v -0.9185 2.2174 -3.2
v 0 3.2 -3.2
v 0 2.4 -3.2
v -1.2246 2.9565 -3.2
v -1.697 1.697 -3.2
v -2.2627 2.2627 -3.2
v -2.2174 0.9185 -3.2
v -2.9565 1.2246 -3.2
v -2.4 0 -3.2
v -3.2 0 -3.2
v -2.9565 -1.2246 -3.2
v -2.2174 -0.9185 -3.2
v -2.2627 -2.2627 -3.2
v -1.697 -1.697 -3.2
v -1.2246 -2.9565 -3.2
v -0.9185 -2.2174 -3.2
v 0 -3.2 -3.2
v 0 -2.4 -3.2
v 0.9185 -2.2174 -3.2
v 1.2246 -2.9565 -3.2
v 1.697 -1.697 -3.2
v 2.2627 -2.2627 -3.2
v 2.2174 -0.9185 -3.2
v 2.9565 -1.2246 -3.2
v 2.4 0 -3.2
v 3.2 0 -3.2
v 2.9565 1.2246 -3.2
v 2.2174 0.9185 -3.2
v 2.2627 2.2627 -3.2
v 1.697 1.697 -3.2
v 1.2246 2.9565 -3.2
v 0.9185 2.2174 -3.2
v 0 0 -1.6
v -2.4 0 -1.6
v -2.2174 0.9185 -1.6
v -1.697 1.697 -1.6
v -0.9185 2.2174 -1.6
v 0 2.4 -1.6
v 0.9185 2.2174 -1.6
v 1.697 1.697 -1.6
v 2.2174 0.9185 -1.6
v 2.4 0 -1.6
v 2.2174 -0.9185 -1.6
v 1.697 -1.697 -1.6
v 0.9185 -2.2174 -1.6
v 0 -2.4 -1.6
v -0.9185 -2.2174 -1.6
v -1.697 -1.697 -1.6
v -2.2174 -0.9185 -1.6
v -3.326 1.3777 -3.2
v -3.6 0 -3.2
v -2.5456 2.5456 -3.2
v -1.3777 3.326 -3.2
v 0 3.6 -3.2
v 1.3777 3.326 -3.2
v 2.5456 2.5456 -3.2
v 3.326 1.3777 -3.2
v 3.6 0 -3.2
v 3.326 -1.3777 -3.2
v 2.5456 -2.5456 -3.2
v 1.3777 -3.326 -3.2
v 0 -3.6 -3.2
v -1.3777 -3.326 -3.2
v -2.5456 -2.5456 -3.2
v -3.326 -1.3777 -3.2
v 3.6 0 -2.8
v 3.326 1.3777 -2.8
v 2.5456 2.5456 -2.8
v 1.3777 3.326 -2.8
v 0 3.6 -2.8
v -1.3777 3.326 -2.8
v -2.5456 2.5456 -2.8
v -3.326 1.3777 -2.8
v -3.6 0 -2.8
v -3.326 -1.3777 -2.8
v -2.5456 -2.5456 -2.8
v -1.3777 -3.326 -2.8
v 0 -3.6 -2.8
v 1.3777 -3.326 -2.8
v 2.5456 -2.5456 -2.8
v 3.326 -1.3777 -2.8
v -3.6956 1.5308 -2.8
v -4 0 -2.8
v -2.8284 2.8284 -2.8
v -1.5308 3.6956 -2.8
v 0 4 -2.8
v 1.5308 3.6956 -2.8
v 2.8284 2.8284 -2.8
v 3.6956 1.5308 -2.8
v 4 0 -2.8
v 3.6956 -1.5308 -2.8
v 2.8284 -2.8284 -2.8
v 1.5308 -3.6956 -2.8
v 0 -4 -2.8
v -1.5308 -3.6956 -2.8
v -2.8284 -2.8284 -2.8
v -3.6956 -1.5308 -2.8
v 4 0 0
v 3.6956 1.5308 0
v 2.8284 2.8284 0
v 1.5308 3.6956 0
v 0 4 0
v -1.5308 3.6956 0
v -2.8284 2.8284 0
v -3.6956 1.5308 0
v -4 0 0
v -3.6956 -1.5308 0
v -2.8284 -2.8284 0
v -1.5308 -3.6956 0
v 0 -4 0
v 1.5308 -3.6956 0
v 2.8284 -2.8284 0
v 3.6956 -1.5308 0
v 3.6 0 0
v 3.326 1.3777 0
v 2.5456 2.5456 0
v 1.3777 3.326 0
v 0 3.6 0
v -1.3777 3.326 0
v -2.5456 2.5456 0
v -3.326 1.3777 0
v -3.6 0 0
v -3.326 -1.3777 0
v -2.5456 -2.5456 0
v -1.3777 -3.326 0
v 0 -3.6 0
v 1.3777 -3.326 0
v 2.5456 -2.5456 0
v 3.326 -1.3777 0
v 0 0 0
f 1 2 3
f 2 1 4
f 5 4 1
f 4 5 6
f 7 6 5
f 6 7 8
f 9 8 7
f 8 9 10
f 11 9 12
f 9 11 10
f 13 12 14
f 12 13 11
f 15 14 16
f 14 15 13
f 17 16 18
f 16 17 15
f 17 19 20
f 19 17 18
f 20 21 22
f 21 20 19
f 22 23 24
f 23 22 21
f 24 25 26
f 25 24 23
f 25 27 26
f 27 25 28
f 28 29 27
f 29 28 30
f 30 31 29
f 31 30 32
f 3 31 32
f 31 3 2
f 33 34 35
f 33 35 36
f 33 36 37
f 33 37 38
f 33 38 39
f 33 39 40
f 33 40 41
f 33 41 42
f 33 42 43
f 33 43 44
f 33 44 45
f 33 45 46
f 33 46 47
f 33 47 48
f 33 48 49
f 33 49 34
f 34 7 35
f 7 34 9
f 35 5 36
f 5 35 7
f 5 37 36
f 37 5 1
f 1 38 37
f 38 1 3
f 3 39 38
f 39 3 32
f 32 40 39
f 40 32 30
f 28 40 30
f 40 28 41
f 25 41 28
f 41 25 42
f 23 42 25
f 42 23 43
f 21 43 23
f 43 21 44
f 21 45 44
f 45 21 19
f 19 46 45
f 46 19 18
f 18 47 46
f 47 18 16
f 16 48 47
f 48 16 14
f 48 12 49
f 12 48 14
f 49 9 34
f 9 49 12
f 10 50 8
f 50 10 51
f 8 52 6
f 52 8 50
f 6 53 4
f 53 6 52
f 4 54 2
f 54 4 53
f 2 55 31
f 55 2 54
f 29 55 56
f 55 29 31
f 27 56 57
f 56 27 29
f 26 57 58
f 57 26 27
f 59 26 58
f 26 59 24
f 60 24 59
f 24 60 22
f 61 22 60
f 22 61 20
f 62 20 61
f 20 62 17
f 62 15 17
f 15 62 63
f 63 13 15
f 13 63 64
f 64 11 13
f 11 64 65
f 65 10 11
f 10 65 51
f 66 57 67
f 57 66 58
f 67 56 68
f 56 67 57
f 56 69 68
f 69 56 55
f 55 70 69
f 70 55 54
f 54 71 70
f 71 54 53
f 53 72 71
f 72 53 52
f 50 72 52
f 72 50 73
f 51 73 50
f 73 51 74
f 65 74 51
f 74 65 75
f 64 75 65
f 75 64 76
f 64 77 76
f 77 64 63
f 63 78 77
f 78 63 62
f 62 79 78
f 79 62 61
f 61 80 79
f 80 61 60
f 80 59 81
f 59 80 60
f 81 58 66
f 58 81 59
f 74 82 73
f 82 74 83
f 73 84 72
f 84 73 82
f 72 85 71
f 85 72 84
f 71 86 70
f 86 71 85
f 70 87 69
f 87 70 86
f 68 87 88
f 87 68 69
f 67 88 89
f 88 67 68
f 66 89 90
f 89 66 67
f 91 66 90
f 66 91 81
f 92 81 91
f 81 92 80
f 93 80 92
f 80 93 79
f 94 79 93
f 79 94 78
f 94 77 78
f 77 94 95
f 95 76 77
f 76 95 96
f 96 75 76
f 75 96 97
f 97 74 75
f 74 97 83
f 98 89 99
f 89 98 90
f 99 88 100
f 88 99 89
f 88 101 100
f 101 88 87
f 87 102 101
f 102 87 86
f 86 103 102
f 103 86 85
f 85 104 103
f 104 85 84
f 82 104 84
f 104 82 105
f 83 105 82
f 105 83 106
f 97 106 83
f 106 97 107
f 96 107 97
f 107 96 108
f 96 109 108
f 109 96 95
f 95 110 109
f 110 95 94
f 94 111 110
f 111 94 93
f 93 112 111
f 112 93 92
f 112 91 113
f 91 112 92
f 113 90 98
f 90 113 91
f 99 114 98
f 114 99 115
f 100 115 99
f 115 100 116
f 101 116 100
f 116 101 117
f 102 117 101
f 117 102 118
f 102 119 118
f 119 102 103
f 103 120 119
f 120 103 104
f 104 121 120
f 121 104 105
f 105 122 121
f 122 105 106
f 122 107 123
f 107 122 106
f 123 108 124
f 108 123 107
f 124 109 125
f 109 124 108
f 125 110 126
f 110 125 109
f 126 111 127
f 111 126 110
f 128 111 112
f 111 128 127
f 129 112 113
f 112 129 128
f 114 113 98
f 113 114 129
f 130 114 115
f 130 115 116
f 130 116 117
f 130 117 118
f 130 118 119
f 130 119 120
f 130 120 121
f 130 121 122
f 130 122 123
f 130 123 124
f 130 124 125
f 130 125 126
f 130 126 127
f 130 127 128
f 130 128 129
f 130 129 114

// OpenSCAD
// file: ../p/4-4ring3.scad
use <../lib.scad>
function ldraw_lib__4_4ring3() = [
// 0 Ring  3 x 1.0
// 0 Name: 4-4ring3.dat
// 0 Author: James Jessiman
// 0 !LDRAW_ORG Primitive UPDATE 2009-01
// 0 !LICENSE Licensed under CC BY 2.0 and CC BY 4.0 : see CAreadme.txt
// 
// 0 BFC CERTIFY CCW
  [0,"BFC","CERTIFY"],
  [0,"BFC","CCW"],
// 
// 0 !HISTORY 1998-12-15 [PTadmin] Official Update 1998-10
// 0 !HISTORY 2002-04-05 [hafhead] Added BFC statement
// 0 !HISTORY 2002-04-25 [PTadmin] Official Update 2002-02
// 0 !HISTORY 2007-06-24 [PTadmin] Header formatted for Contributor Agreement
// 0 !HISTORY 2008-07-01 [PTadmin] Official Update 2008-01
// 0 !HISTORY 2008-08-26 [cwdee] Switch polygon winding and rename
// 0 !HISTORY 2009-05-02 [PTadmin] Official Update 2009-01
// 
// 
// 4 16 -1.5308 0 3.6956 -1.1481 0 2.7717 0 0 3 0 0 4
  [4,16,-1.5308,0,3.6956,-1.1481,0,2.7717,0,0,3,0,0,4],
// 4 16 -2.8284 0 2.8284 -2.1213 0 2.1213 -1.1481 0 2.7717 -1.5308 0 3.6956
  [4,16,-2.8284,0,2.8284,-2.1213,0,2.1213,-1.1481,0,2.7717,-1.5308,0,3.6956],
// 4 16 -3.6956 0 1.5308 -2.7717 0 1.1481 -2.1213 0 2.1213 -2.8284 0 2.8284
  [4,16,-3.6956,0,1.5308,-2.7717,0,1.1481,-2.1213,0,2.1213,-2.8284,0,2.8284],
// 4 16 -4 0 0 -3 0 0 -2.7717 0 1.1481 -3.6956 0 1.5308
  [4,16,-4,0,0,-3,0,0,-2.7717,0,1.1481,-3.6956,0,1.5308],
// 4 16 -3.6956 0 -1.5308 -2.7717 0 -1.1481 -3 0 0 -4 0 0
  [4,16,-3.6956,0,-1.5308,-2.7717,0,-1.1481,-3,0,0,-4,0,0],
// 4 16 -2.8284 0 -2.8284 -2.1213 0 -2.1213 -2.7717 0 -1.1481 -3.6956 0 -1.5308
  [4,16,-2.8284,0,-2.8284,-2.1213,0,-2.1213,-2.7717,0,-1.1481,-3.6956,0,-1.5308],
// 4 16 -1.5308 0 -3.6956 -1.1481 0 -2.7717 -2.1213 0 -2.1213 -2.8284 0 -2.8284
  [4,16,-1.5308,0,-3.6956,-1.1481,0,-2.7717,-2.1213,0,-2.1213,-2.8284,0,-2.8284],
// 4 16 0 0 -4 0 0 -3 -1.1481 0 -2.7717 -1.5308 0 -3.6956
  [4,16,0,0,-4,0,0,-3,-1.1481,0,-2.7717,-1.5308,0,-3.6956],
// 4 16 1.5308 0 -3.6956 1.1481 0 -2.7717 0 0 -3 0 0 -4
  [4,16,1.5308,0,-3.6956,1.1481,0,-2.7717,0,0,-3,0,0,-4],
// 4 16 2.8284 0 -2.8284 2.1213 0 -2.1213 1.1481 0 -2.7717 1.5308 0 -3.6956
  [4,16,2.8284,0,-2.8284,2.1213,0,-2.1213,1.1481,0,-2.7717,1.5308,0,-3.6956],
// 4 16 3.6956 0 -1.5308 2.7717 0 -1.1481 2.1213 0 -2.1213 2.8284 0 -2.8284
  [4,16,3.6956,0,-1.5308,2.7717,0,-1.1481,2.1213,0,-2.1213,2.8284,0,-2.8284],
// 4 16 4 0 0 3 0 0 2.7717 0 -1.1481 3.6956 0 -1.5308
  [4,16,4,0,0,3,0,0,2.7717,0,-1.1481,3.6956,0,-1.5308],
// 4 16 3.6956 0 1.5308 2.7717 0 1.1481 3 0 0 4 0 0
  [4,16,3.6956,0,1.5308,2.7717,0,1.1481,3,0,0,4,0,0],
// 4 16 2.8284 0 2.8284 2.1213 0 2.1213 2.7717 0 1.1481 3.6956 0 1.5308
  [4,16,2.8284,0,2.8284,2.1213,0,2.1213,2.7717,0,1.1481,3.6956,0,1.5308],
// 4 16 1.5308 0 3.6956 1.1481 0 2.7717 2.1213 0 2.1213 2.8284 0 2.8284
  [4,16,1.5308,0,3.6956,1.1481,0,2.7717,2.1213,0,2.1213,2.8284,0,2.8284],
// 4 16 0 0 4 0 0 3 1.1481 0 2.7717 1.5308 0 3.6956
  [4,16,0,0,4,0,0,3,1.1481,0,2.7717,1.5308,0,3.6956],
// 0
];
makepoly(ldraw_lib__4_4ring3(), line=0.2);
// file: ../p/4-4cylc.scad
use <../lib.scad>
use <4-4cyli.scad>
use <4-4disc.scad>
use <4-4edge.scad>
function ldraw_lib__4_4cylc() = [
// 0 Cylinder Closed 1.0
// 0 Name: 4-4cylc.dat
// 0 Author: Alex Taylor [anathema]
// 0 !LDRAW_ORG Primitive UPDATE 2009-02
// 0 !LICENSE Licensed under CC BY 2.0 and CC BY 4.0 : see CAreadme.txt
// 
// 0 BFC CERTIFY CCW
  [0,"BFC","CERTIFY"],
  [0,"BFC","CCW"],
// 
// 0 !HISTORY 2008-12-29 [cwdee] Removed one disc
// 0 !HISTORY 2009-09-03 [PTadmin] Official Update 2009-02
// 
// 
// 1 16 0 0 0 1 0 0 0 1 0 0 0 1 4-4edge.dat
  [1,16,0,0,0,1,0,0,0,1,0,0,0,1, ldraw_lib__4_4edge()],
// 1 16 0 1 0 1 0 0 0 1 0 0 0 1 4-4edge.dat
  [1,16,0,1,0,1,0,0,0,1,0,0,0,1, ldraw_lib__4_4edge()],
// 1 16 0 0 0 1 0 0 0 1 0 0 0 1 4-4disc.dat
  [1,16,0,0,0,1,0,0,0,1,0,0,0,1, ldraw_lib__4_4disc()],
// 1 16 0 0 0 1 0 0 0 1 0 0 0 1 4-4cyli.dat
  [1,16,0,0,0,1,0,0,0,1,0,0,0,1, ldraw_lib__4_4cyli()],
// 0
];
makepoly(ldraw_lib__4_4cylc(), line=0.2);
// file: ../p/4-4edge.scad
use <../lib.scad>
function ldraw_lib__4_4edge() = [
// 0 Circle 1.0
// 0 Name: 4-4edge.dat
// 0 Author: James Jessiman
// 0 !LDRAW_ORG Primitive UPDATE 2017-01
// 0 !LICENSE Licensed under CC BY 2.0 and CC BY 4.0 : see CAreadme.txt
// 
// 0 BFC CERTIFY CCW
  [0,"BFC","CERTIFY"],
  [0,"BFC","CCW"],
// 
// 0 !HISTORY 1998-12-15 [PTadmin] Official Update 1998-10
// 0 !HISTORY 2005-12-28 [PTadmin] Official Update 2005-01
// 0 !HISTORY 2007-06-24 [PTadmin] Header formatted for Contributor Agreement
// 0 !HISTORY 2008-07-01 [PTadmin] Official Update 2008-01
// 0 !HISTORY 2017-01-15 [Steffen] BFCed
// 0 !HISTORY 2017-12-30 [PTadmin] Official Update 2017-01
// 
// 
// 2 24 1 0 0 0.9239 0 0.3827
  [2,24,1,0,0,0.9239,0,0.3827],
// 2 24 0.9239 0 0.3827 0.7071 0 0.7071
  [2,24,0.9239,0,0.3827,0.7071,0,0.7071],
// 2 24 0.7071 0 0.7071 0.3827 0 0.9239
  [2,24,0.7071,0,0.7071,0.3827,0,0.9239],
// 2 24 0.3827 0 0.9239 0 0 1
  [2,24,0.3827,0,0.9239,0,0,1],
// 2 24 0 0 1 -0.3827 0 0.9239
  [2,24,0,0,1,-0.3827,0,0.9239],
// 2 24 -0.3827 0 0.9239 -0.7071 0 0.7071
  [2,24,-0.3827,0,0.9239,-0.7071,0,0.7071],
// 2 24 -0.7071 0 0.7071 -0.9239 0 0.3827
  [2,24,-0.7071,0,0.7071,-0.9239,0,0.3827],
// 2 24 -0.9239 0 0.3827 -1 0 -0
  [2,24,-0.9239,0,0.3827,-1,0,-0],
// 2 24 -1 0 -0 -0.9239 0 -0.3827
  [2,24,-1,0,-0,-0.9239,0,-0.3827],
// 2 24 -0.9239 0 -0.3827 -0.7071 0 -0.7071
  [2,24,-0.9239,0,-0.3827,-0.7071,0,-0.7071],
// 2 24 -0.7071 0 -0.7071 -0.3827 0 -0.9239
  [2,24,-0.7071,0,-0.7071,-0.3827,0,-0.9239],
// 2 24 -0.3827 0 -0.9239 0 0 -1
  [2,24,-0.3827,0,-0.9239,0,0,-1],
// 2 24 0 0 -1 0.3827 0 -0.9239
  [2,24,0,0,-1,0.3827,0,-0.9239],
// 2 24 0.3827 0 -0.9239 0.7071 0 -0.7071
  [2,24,0.3827,0,-0.9239,0.7071,0,-0.7071],
// 2 24 0.7071 0 -0.7071 0.9239 0 -0.3827
  [2,24,0.7071,0,-0.7071,0.9239,0,-0.3827],
// 2 24 0.9239 0 -0.3827 1 0 0
  [2,24,0.9239,0,-0.3827,1,0,0],
];
makepoly(ldraw_lib__4_4edge(), line=0.2);
// file: ../p/4-4cyli.scad
use <../lib.scad>
function ldraw_lib__4_4cyli() = [
// 0 Cylinder 1.0
// 0 Name: 4-4cyli.dat
// 0 Author: James Jessiman
// 0 !LDRAW_ORG Primitive UPDATE 2005-01
// 0 !LICENSE Licensed under CC BY 2.0 and CC BY 4.0 : see CAreadme.txt
// 
// 0 BFC CERTIFY CCW
  [0,"BFC","CERTIFY"],
  [0,"BFC","CCW"],
// 
// 0 !HISTORY 1998-12-15 [PTadmin] Official Update 1998-10
// 0 !HISTORY 2002-03-23 [sbliss] Added BFC statement; merged headers from files in distributions LDraw 0.27 and Complete.
// 0 !HISTORY 2002-04-25 [PTadmin] Official Update 2002-02
// 0 !HISTORY 2004-12-14 [guyvivan] BFC CCW
// 0 !HISTORY 2005-12-28 [PTadmin] Official Update 2005-01
// 0 !HISTORY 2007-06-24 [PTadmin] Header formatted for Contributor Agreement
// 0 !HISTORY 2008-07-01 [PTadmin] Official Update 2008-01
// 
// 
// 4 16 1 1 0 0.9239 1 0.3827 0.9239 0 0.3827 1 0 0
  [4,16,1,1,0,0.9239,1,0.3827,0.9239,0,0.3827,1,0,0],
// 5 24 1 0 0 1 1 0 0.9239 0 0.3827 0.9239 0 -0.3827
  [5,24,1,0,0,1,1,0,0.9239,0,0.3827,0.9239,0,-0.3827],
// 4 16 0.9239 1 0.3827 0.7071 1 0.7071 0.7071 0 0.7071 0.9239 0 0.3827
  [4,16,0.9239,1,0.3827,0.7071,1,0.7071,0.7071,0,0.7071,0.9239,0,0.3827],
// 5 24 0.9239 0 0.3827 0.9239 1 0.3827 0.7071 0 0.7071 1 0 0
  [5,24,0.9239,0,0.3827,0.9239,1,0.3827,0.7071,0,0.7071,1,0,0],
// 4 16 0.7071 1 0.7071 0.3827 1 0.9239 0.3827 0 0.9239 0.7071 0 0.7071
  [4,16,0.7071,1,0.7071,0.3827,1,0.9239,0.3827,0,0.9239,0.7071,0,0.7071],
// 5 24 0.7071 0 0.7071 0.7071 1 0.7071 0.3827 0 0.9239 0.9239 0 0.3827
  [5,24,0.7071,0,0.7071,0.7071,1,0.7071,0.3827,0,0.9239,0.9239,0,0.3827],
// 4 16 0.3827 1 0.9239 0 1 1 0 0 1 0.3827 0 0.9239
  [4,16,0.3827,1,0.9239,0,1,1,0,0,1,0.3827,0,0.9239],
// 5 24 0.3827 0 0.9239 0.3827 1 0.9239 0 0 1 0.7071 0 0.7071
  [5,24,0.3827,0,0.9239,0.3827,1,0.9239,0,0,1,0.7071,0,0.7071],
// 4 16 0 1 1 -0.3827 1 0.9239 -0.3827 0 0.9239 0 0 1
  [4,16,0,1,1,-0.3827,1,0.9239,-0.3827,0,0.9239,0,0,1],
// 5 24 0 0 1 0 1 1 -0.3827 0 0.9239 0.3827 0 0.9239
  [5,24,0,0,1,0,1,1,-0.3827,0,0.9239,0.3827,0,0.9239],
// 4 16 -0.3827 1 0.9239 -0.7071 1 0.7071 -0.7071 0 0.7071 -0.3827 0 0.9239
  [4,16,-0.3827,1,0.9239,-0.7071,1,0.7071,-0.7071,0,0.7071,-0.3827,0,0.9239],
// 5 24 -0.3827 0 0.9239 -0.3827 1 0.9239 -0.7071 0 0.7071 0 0 1
  [5,24,-0.3827,0,0.9239,-0.3827,1,0.9239,-0.7071,0,0.7071,0,0,1],
// 4 16 -0.7071 1 0.7071 -0.9239 1 0.3827 -0.9239 0 0.3827 -0.7071 0 0.7071
  [4,16,-0.7071,1,0.7071,-0.9239,1,0.3827,-0.9239,0,0.3827,-0.7071,0,0.7071],
// 5 24 -0.7071 0 0.7071 -0.7071 1 0.7071 -0.9239 0 0.3827 -0.3827 0 0.9239
  [5,24,-0.7071,0,0.7071,-0.7071,1,0.7071,-0.9239,0,0.3827,-0.3827,0,0.9239],
// 4 16 -0.9239 1 0.3827 -1 1 0 -1 0 0 -0.9239 0 0.3827
  [4,16,-0.9239,1,0.3827,-1,1,0,-1,0,0,-0.9239,0,0.3827],
// 5 24 -0.9239 0 0.3827 -0.9239 1 0.3827 -1 0 0 -0.7071 0 0.7071
  [5,24,-0.9239,0,0.3827,-0.9239,1,0.3827,-1,0,0,-0.7071,0,0.7071],
// 4 16 -1 1 0 -0.9239 1 -0.3827 -0.9239 0 -0.3827 -1 0 0
  [4,16,-1,1,0,-0.9239,1,-0.3827,-0.9239,0,-0.3827,-1,0,0],
// 5 24 -1 0 0 -1 1 0 -0.9239 0 -0.3827 -0.9239 0 0.3827
  [5,24,-1,0,0,-1,1,0,-0.9239,0,-0.3827,-0.9239,0,0.3827],
// 4 16 -0.9239 1 -0.3827 -0.7071 1 -0.7071 -0.7071 0 -0.7071 -0.9239 0 -0.3827
  [4,16,-0.9239,1,-0.3827,-0.7071,1,-0.7071,-0.7071,0,-0.7071,-0.9239,0,-0.3827],
// 5 24 -0.9239 0 -0.3827 -0.9239 1 -0.3827 -0.7071 0 -0.7071 -1 0 0
  [5,24,-0.9239,0,-0.3827,-0.9239,1,-0.3827,-0.7071,0,-0.7071,-1,0,0],
// 4 16 -0.7071 1 -0.7071 -0.3827 1 -0.9239 -0.3827 0 -0.9239 -0.7071 0 -0.7071
  [4,16,-0.7071,1,-0.7071,-0.3827,1,-0.9239,-0.3827,0,-0.9239,-0.7071,0,-0.7071],
// 5 24 -0.7071 0 -0.7071 -0.7071 1 -0.7071 -0.3827 0 -0.9239 -0.9239 0 -0.3827
  [5,24,-0.7071,0,-0.7071,-0.7071,1,-0.7071,-0.3827,0,-0.9239,-0.9239,0,-0.3827],
// 4 16 -0.3827 1 -0.9239 0 1 -1 0 0 -1 -0.3827 0 -0.9239
  [4,16,-0.3827,1,-0.9239,0,1,-1,0,0,-1,-0.3827,0,-0.9239],
// 5 24 -0.3827 0 -0.9239 -0.3827 1 -0.9239 0 0 -1 -0.7071 0 -0.7071
  [5,24,-0.3827,0,-0.9239,-0.3827,1,-0.9239,0,0,-1,-0.7071,0,-0.7071],
// 4 16 0 1 -1 0.3827 1 -0.9239 0.3827 0 -0.9239 0 0 -1
  [4,16,0,1,-1,0.3827,1,-0.9239,0.3827,0,-0.9239,0,0,-1],
// 5 24 0 0 -1 0 1 -1 0.3827 0 -0.9239 -0.3827 0 -0.9239
  [5,24,0,0,-1,0,1,-1,0.3827,0,-0.9239,-0.3827,0,-0.9239],
// 4 16 0.3827 1 -0.9239 0.7071 1 -0.7071 0.7071 0 -0.7071 0.3827 0 -0.9239
  [4,16,0.3827,1,-0.9239,0.7071,1,-0.7071,0.7071,0,-0.7071,0.3827,0,-0.9239],
// 5 24 0.3827 0 -0.9239 0.3827 1 -0.9239 0.7071 0 -0.7071 0 0 -1
  [5,24,0.3827,0,-0.9239,0.3827,1,-0.9239,0.7071,0,-0.7071,0,0,-1],
// 4 16 0.7071 1 -0.7071 0.9239 1 -0.3827 0.9239 0 -0.3827 0.7071 0 -0.7071
  [4,16,0.7071,1,-0.7071,0.9239,1,-0.3827,0.9239,0,-0.3827,0.7071,0,-0.7071],
// 5 24 0.7071 0 -0.7071 0.7071 1 -0.7071 0.9239 0 -0.3827 0.3827 0 -0.9239
  [5,24,0.7071,0,-0.7071,0.7071,1,-0.7071,0.9239,0,-0.3827,0.3827,0,-0.9239],
// 4 16 0.9239 1 -0.3827 1 1 0 1 0 0 0.9239 0 -0.3827
  [4,16,0.9239,1,-0.3827,1,1,0,1,0,0,0.9239,0,-0.3827],
// 5 24 0.9239 0 -0.3827 0.9239 1 -0.3827 1 0 0 0.7071 0 -0.7071
  [5,24,0.9239,0,-0.3827,0.9239,1,-0.3827,1,0,0,0.7071,0,-0.7071],
// 0
];
makepoly(ldraw_lib__4_4cyli(), line=0.2);
// file: ../p/stud4o.scad
use <../lib.scad>
use <4-4cylc.scad>
use <4-4ring3.scad>
function ldraw_lib__stud4o() = [
// 0 Stud Tube Open without Outer Cylinder
// 0 Name: stud4o.dat
// 0 Author: Magnus Forsberg [MagFors]
// 0 !LDRAW_ORG Primitive UPDATE 2011-02
// 0 !LICENSE Licensed under CC BY 2.0 and CC BY 4.0 : see CAreadme.txt
// 
// 0 !HELP This stud is a "antistud" to be used like a underside stud,
// 0 !HELP but without the outer cylinder.
// 0 !HELP 1 47 0 0 0 1 0 0 0 1 0 0 0 1 stud4.dat
// 
// 0 BFC CERTIFY CCW
  [0,"BFC","CERTIFY"],
  [0,"BFC","CCW"],
// 
// 0 !HISTORY 2011-12-29 [PTadmin] Official Update 2011-02
// 
// 
// 1 16 0 -4 0 2 0 0 0 1 0 0 0 2 4-4ring3.dat
  [1,16,0,-4,0,2,0,0,0,1,0,0,0,2, ldraw_lib__4_4ring3()],
// 0 BFC INVERTNEXT
  [0,"BFC","INVERTNEXT"],
// 1 16 0 0 0 -6 0 0 0 -4 0 0 0 6 4-4cylc.dat
  [1,16,0,0,0,-6,0,0,0,-4,0,0,0,6, ldraw_lib__4_4cylc()],
];
makepoly(ldraw_lib__stud4o(), line=0.2);
// file: ../p/4-4ring8.scad
use <../lib.scad>
function ldraw_lib__4_4ring8() = [
// 0 Ring  8 x 1.0
// 0 Name: 4-4ring8.dat
// 0 Author: Steffen [Steffen]
// 0 !LDRAW_ORG Primitive UPDATE 2012-01
// 0 !LICENSE Licensed under CC BY 2.0 and CC BY 4.0 : see CAreadme.txt
// 
// 0 BFC CERTIFY CCW
  [0,"BFC","CERTIFY"],
  [0,"BFC","CCW"],
// 
// 0 !HISTORY 2003-12-19 [PTadmin] Official Update 2003-03
// 0 !HISTORY 2007-06-24 [PTadmin] Header formatted for Contributor Agreement
// 0 !HISTORY 2008-07-01 [PTadmin] Official Update 2008-01
// 0 !HISTORY 2012-02-16 [Philo] Changed to CCW
// 0 !HISTORY 2012-03-30 [PTadmin] Official Update 2012-01
// 
// 
// 4 16 9 0 0 8.3151 0 3.4443 7.3912 0 3.0616 8 0 0
  [4,16,9,0,0,8.3151,0,3.4443,7.3912,0,3.0616,8,0,0],
// 4 16 8.3151 0 3.4443 6.3639 0 6.3639 5.6568 0 5.6568 7.3912 0 3.0616
  [4,16,8.3151,0,3.4443,6.3639,0,6.3639,5.6568,0,5.6568,7.3912,0,3.0616],
// 4 16 6.3639 0 6.3639 3.4443 0 8.3151 3.0616 0 7.3912 5.6568 0 5.6568
  [4,16,6.3639,0,6.3639,3.4443,0,8.3151,3.0616,0,7.3912,5.6568,0,5.6568],
// 4 16 3.4443 0 8.3151 0 0 9 0 0 8 3.0616 0 7.3912
  [4,16,3.4443,0,8.3151,0,0,9,0,0,8,3.0616,0,7.3912],
// 4 16 0 0 9 -3.4443 0 8.3151 -3.0616 0 7.3912 0 0 8
  [4,16,0,0,9,-3.4443,0,8.3151,-3.0616,0,7.3912,0,0,8],
// 4 16 -3.4443 0 8.3151 -6.3639 0 6.3639 -5.6568 0 5.6568 -3.0616 0 7.3912
  [4,16,-3.4443,0,8.3151,-6.3639,0,6.3639,-5.6568,0,5.6568,-3.0616,0,7.3912],
// 4 16 -6.3639 0 6.3639 -8.3151 0 3.4443 -7.3912 0 3.0616 -5.6568 0 5.6568
  [4,16,-6.3639,0,6.3639,-8.3151,0,3.4443,-7.3912,0,3.0616,-5.6568,0,5.6568],
// 4 16 -8.3151 0 3.4443 -9 0 0 -8 0 0 -7.3912 0 3.0616
  [4,16,-8.3151,0,3.4443,-9,0,0,-8,0,0,-7.3912,0,3.0616],
// 4 16 -9 0 0 -8.3151 0 -3.4443 -7.3912 0 -3.0616 -8 0 0
  [4,16,-9,0,0,-8.3151,0,-3.4443,-7.3912,0,-3.0616,-8,0,0],
// 4 16 -8.3151 0 -3.4443 -6.3639 0 -6.3639 -5.6568 0 -5.6568 -7.3912 0 -3.0616
  [4,16,-8.3151,0,-3.4443,-6.3639,0,-6.3639,-5.6568,0,-5.6568,-7.3912,0,-3.0616],
// 4 16 -6.3639 0 -6.3639 -3.4443 0 -8.3151 -3.0616 0 -7.3912 -5.6568 0 -5.6568
  [4,16,-6.3639,0,-6.3639,-3.4443,0,-8.3151,-3.0616,0,-7.3912,-5.6568,0,-5.6568],
// 4 16 -3.4443 0 -8.3151 0 0 -9 0 0 -8 -3.0616 0 -7.3912
  [4,16,-3.4443,0,-8.3151,0,0,-9,0,0,-8,-3.0616,0,-7.3912],
// 4 16 0 0 -9 3.4443 0 -8.3151 3.0616 0 -7.3912 0 0 -8
  [4,16,0,0,-9,3.4443,0,-8.3151,3.0616,0,-7.3912,0,0,-8],
// 4 16 3.4443 0 -8.3151 6.3639 0 -6.3639 5.6568 0 -5.6568 3.0616 0 -7.3912
  [4,16,3.4443,0,-8.3151,6.3639,0,-6.3639,5.6568,0,-5.6568,3.0616,0,-7.3912],
// 4 16 6.3639 0 -6.3639 8.3151 0 -3.4443 7.3912 0 -3.0616 5.6568 0 -5.6568
  [4,16,6.3639,0,-6.3639,8.3151,0,-3.4443,7.3912,0,-3.0616,5.6568,0,-5.6568],
// 4 16 8.3151 0 -3.4443 9 0 0 8 0 0 7.3912 0 -3.0616
  [4,16,8.3151,0,-3.4443,9,0,0,8,0,0,7.3912,0,-3.0616],
];
makepoly(ldraw_lib__4_4ring8(), line=0.2);
// file: ../p/4-4cylo.scad
use <../lib.scad>
use <4-4cyli.scad>
use <4-4edge.scad>
function ldraw_lib__4_4cylo() = [
// 0 Cylinder Open 1.0
// 0 Name: 4-4cylo.dat
// 0 Author: Mark Kennedy [mkennedy]
// 0 !LDRAW_ORG Primitive UPDATE 2010-01
// 0 !LICENSE Licensed under CC BY 2.0 and CC BY 4.0 : see CAreadme.txt
// 
// 0 BFC CERTIFY CCW
  [0,"BFC","CERTIFY"],
  [0,"BFC","CCW"],
// 
// 0 !HISTORY 2010-04-05 [PTadmin] Official Update 2010-01
// 
// 
// 1 16 0 0 0 1 0 0 0 1 0 0 0 1 4-4edge.dat
  [1,16,0,0,0,1,0,0,0,1,0,0,0,1, ldraw_lib__4_4edge()],
// 1 16 0 1 0 1 0 0 0 1 0 0 0 1 4-4edge.dat
  [1,16,0,1,0,1,0,0,0,1,0,0,0,1, ldraw_lib__4_4edge()],
// 1 16 0 0 0 1 0 0 0 1 0 0 0 1 4-4cyli.dat
  [1,16,0,0,0,1,0,0,0,1,0,0,0,1, ldraw_lib__4_4cyli()],
// 0
];
makepoly(ldraw_lib__4_4cylo(), line=0.2);
// file: s/98138s02.scad
use <../../lib.scad>
use <../../p/4-4cylo.scad>
use <../../p/4-4ring8.scad>
use <../../p/4-4ring9.scad>
use <../../p/stud4o.scad>
function ldraw_lib__s__98138s02() = [
// 0 ~Tile  1 x  1 Round with Groove without Complete Top Face
// 0 Name: s\98138s02.dat
// 0 Author: Magnus Forsberg [MagFors]
// 0 !LDRAW_ORG Subpart UPDATE 2020-01
// 0 !LICENSE Licensed under CC BY 2.0 and CC BY 4.0 : see CAreadme.txt
// 
// 0 BFC CERTIFY CCW
  [0,"BFC","CERTIFY"],
  [0,"BFC","CCW"],
// 
// 0 !HISTORY 2020-06-28 [PTadmin] Official Update 2020-01
// 
// 
// 1 16 0 4 0 1 0 0 0 -1 0 0 0 1 stud4o.dat
  [1,16,0,4,0,1,0,0,0,-1,0,0,0,1, ldraw_lib__stud4o()],
// 1 16 0 8 0 -1 0 0 0 -1 0 0 0 1 4-4ring8.dat
  [1,16,0,8,0,-1,0,0,0,-1,0,0,0,1, ldraw_lib__4_4ring8()],
// 1 16 0 7 0 9 0 0 0 1 0 0 0 9 4-4cylo.dat
  [1,16,0,7,0,9,0,0,0,1,0,0,0,9, ldraw_lib__4_4cylo()],
// 1 16 0 7 0 -1 0 0 0 -1 0 0 0 1 4-4ring9.dat
  [1,16,0,7,0,-1,0,0,0,-1,0,0,0,1, ldraw_lib__4_4ring9()],
// 1 16 0 0 0 10 0 0 0 7 0 0 0 10 4-4cylo.dat
  [1,16,0,0,0,10,0,0,0,7,0,0,0,10, ldraw_lib__4_4cylo()],
];
makepoly(ldraw_lib__s__98138s02(), line=0.2);
// file: ../p/4-4ring9.scad
use <../lib.scad>
function ldraw_lib__4_4ring9() = [
// 0 Ring  9 x 1.0
// 0 Name: 4-4ring9.dat
// 0 Author: John Riley [jriley]
// 0 !LDRAW_ORG Primitive UPDATE 2004-02
// 0 !LICENSE Licensed under CC BY 2.0 and CC BY 4.0 : see CAreadme.txt
// 
// 0 BFC CERTIFY CCW
  [0,"BFC","CERTIFY"],
  [0,"BFC","CCW"],
// 
// 0 !HISTORY 2004-04-22 [PTadmin] Official Update 2004-02
// 0 !HISTORY 2007-06-24 [PTadmin] Header formatted for Contributor Agreement
// 0 !HISTORY 2008-07-01 [PTadmin] Official Update 2008-01
// 
// 
// 4 16 9 0 0 10 0 0 9.239 0 3.827 8.3151 0 3.4443
  [4,16,9,0,0,10,0,0,9.239,0,3.827,8.3151,0,3.4443],
// 4 16 8.3151 0 3.4443 9.239 0 3.827 7.071 0 7.071 6.3639 0 6.3639
  [4,16,8.3151,0,3.4443,9.239,0,3.827,7.071,0,7.071,6.3639,0,6.3639],
// 4 16 6.3639 0 6.3639 7.071 0 7.071 3.827 0 9.239 3.4443 0 8.3151
  [4,16,6.3639,0,6.3639,7.071,0,7.071,3.827,0,9.239,3.4443,0,8.3151],
// 4 16 3.4443 0 8.3151 3.827 0 9.239 0 0 10 0 0 9
  [4,16,3.4443,0,8.3151,3.827,0,9.239,0,0,10,0,0,9],
// 4 16 0 0 9 0 0 10 -3.827 0 9.239 -3.4443 0 8.3151
  [4,16,0,0,9,0,0,10,-3.827,0,9.239,-3.4443,0,8.3151],
// 4 16 -3.4443 0 8.3151 -3.827 0 9.239 -7.071 0 7.071 -6.3639 0 6.3639
  [4,16,-3.4443,0,8.3151,-3.827,0,9.239,-7.071,0,7.071,-6.3639,0,6.3639],
// 4 16 -6.3639 0 6.3639 -7.071 0 7.071 -9.239 0 3.827 -8.3151 0 3.4443
  [4,16,-6.3639,0,6.3639,-7.071,0,7.071,-9.239,0,3.827,-8.3151,0,3.4443],
// 4 16 -8.3151 0 3.4443 -9.239 0 3.827 -10 0 0 -9 0 0
  [4,16,-8.3151,0,3.4443,-9.239,0,3.827,-10,0,0,-9,0,0],
// 4 16 -9 0 0 -10 0 0 -9.239 0 -3.827 -8.3151 0 -3.4443
  [4,16,-9,0,0,-10,0,0,-9.239,0,-3.827,-8.3151,0,-3.4443],
// 4 16 -8.3151 0 -3.4443 -9.239 0 -3.827 -7.071 0 -7.071 -6.3639 0 -6.3639
  [4,16,-8.3151,0,-3.4443,-9.239,0,-3.827,-7.071,0,-7.071,-6.3639,0,-6.3639],
// 4 16 -6.3639 0 -6.3639 -7.071 0 -7.071 -3.827 0 -9.239 -3.4443 0 -8.3151
  [4,16,-6.3639,0,-6.3639,-7.071,0,-7.071,-3.827,0,-9.239,-3.4443,0,-8.3151],
// 4 16 -3.4443 0 -8.3151 -3.827 0 -9.239 0 0 -10 0 0 -9
  [4,16,-3.4443,0,-8.3151,-3.827,0,-9.239,0,0,-10,0,0,-9],
// 4 16 0 0 -9 0 0 -10 3.827 0 -9.239 3.4443 0 -8.3151
  [4,16,0,0,-9,0,0,-10,3.827,0,-9.239,3.4443,0,-8.3151],
// 4 16 3.4443 0 -8.3151 3.827 0 -9.239 7.071 0 -7.071 6.3639 0 -6.3639
  [4,16,3.4443,0,-8.3151,3.827,0,-9.239,7.071,0,-7.071,6.3639,0,-6.3639],
// 4 16 6.3639 0 -6.3639 7.071 0 -7.071 9.239 0 -3.827 8.3151 0 -3.4443
  [4,16,6.3639,0,-6.3639,7.071,0,-7.071,9.239,0,-3.827,8.3151,0,-3.4443],
// 4 16 8.3151 0 -3.4443 9.239 0 -3.827 10 0 0 9 0 0
  [4,16,8.3151,0,-3.4443,9.239,0,-3.827,10,0,0,9,0,0],
// 0
];
makepoly(ldraw_lib__4_4ring9(), line=0.2);
// file: s/98138s01.scad
use <../../lib.scad>
use <../../p/4-4ring9.scad>
use <98138s02.scad>
function ldraw_lib__s__98138s01() = [
// 0 ~Tile  1 x  1 Round with Groove with Partial Top Face
// 0 Name: s\98138s01.dat
// 0 Author: Magnus Forsberg [MagFors]
// 0 !LDRAW_ORG Subpart UPDATE 2020-01
// 0 !LICENSE Licensed under CC BY 2.0 and CC BY 4.0 : see CAreadme.txt
// 
// 0 BFC CERTIFY CCW
  [0,"BFC","CERTIFY"],
  [0,"BFC","CCW"],
// 
// 0 !HISTORY 2011-12-29 [PTadmin] Official Update 2011-02
// 0 !HISTORY 2016-06-17 [MagFors] Reduced the rounded edge to 0.5 ldu
// 0 !HISTORY 2016-12-31 [PTadmin] Official Update 2016-01
// 0 !HISTORY 2019-06-17 [MagFors] Removed the rounded edge
// 0 !HISTORY 2019-07-19 [MagFors] Subfiled without top surface
// 0 !HISTORY 2020-06-28 [PTadmin] Official Update 2020-01
// 
// 
// 1 16 0 0 0 1 0 0 0 1 0 0 0 1 s\98138s02.dat
  [1,16,0,0,0,1,0,0,0,1,0,0,0,1, ldraw_lib__s__98138s02()],
// 1 16 0 0 0 1 0 0 0 1 0 0 0 1 4-4ring9.dat
  [1,16,0,0,0,1,0,0,0,1,0,0,0,1, ldraw_lib__4_4ring9()],
];
makepoly(ldraw_lib__s__98138s01(), line=0.2);
// file: ../p/4-4disc.scad
use <../lib.scad>
function ldraw_lib__4_4disc() = [
// 0 Disc 1.0
// 0 Name: 4-4disc.dat
// 0 Author: James Jessiman
// 0 !LDRAW_ORG Primitive UPDATE 2002-02
// 0 !LICENSE Licensed under CC BY 2.0 and CC BY 4.0 : see CAreadme.txt
// 
// 0 BFC CERTIFY CCW
  [0,"BFC","CERTIFY"],
  [0,"BFC","CCW"],
// 
// 0 !HISTORY 1998-12-15 [PTadmin] Official Update 1998-10
// 0 !HISTORY 2002-03-23 [sbliss] Added BFC statement
// 0 !HISTORY 2002-04-25 [PTadmin] Official Update 2002-02
// 0 !HISTORY 2007-06-24 [PTadmin] Header formatted for Contributor Agreement
// 0 !HISTORY 2008-07-01 [PTadmin] Official Update 2008-01
// 
// 
// 3 16 0 0 0 1 0 0 0.9239 0 0.3827
  [3,16,0,0,0,1,0,0,0.9239,0,0.3827],
// 3 16 0 0 0 0.9239 0 0.3827 0.7071 0 0.7071
  [3,16,0,0,0,0.9239,0,0.3827,0.7071,0,0.7071],
// 3 16 0 0 0 0.7071 0 0.7071 0.3827 0 0.9239
  [3,16,0,0,0,0.7071,0,0.7071,0.3827,0,0.9239],
// 3 16 0 0 0 0.3827 0 0.9239 0 0 1
  [3,16,0,0,0,0.3827,0,0.9239,0,0,1],
// 3 16 0 0 0 0 0 1 -0.3827 0 0.9239
  [3,16,0,0,0,0,0,1,-0.3827,0,0.9239],
// 3 16 0 0 0 -0.3827 0 0.9239 -0.7071 0 0.7071
  [3,16,0,0,0,-0.3827,0,0.9239,-0.7071,0,0.7071],
// 3 16 0 0 0 -0.7071 0 0.7071 -0.9239 0 0.3827
  [3,16,0,0,0,-0.7071,0,0.7071,-0.9239,0,0.3827],
// 3 16 0 0 0 -0.9239 0 0.3827 -1 0 -0
  [3,16,0,0,0,-0.9239,0,0.3827,-1,0,-0],
// 3 16 0 0 0 -1 0 -0 -0.9239 0 -0.3827
  [3,16,0,0,0,-1,0,-0,-0.9239,0,-0.3827],
// 3 16 0 0 0 -0.9239 0 -0.3827 -0.7071 0 -0.7071
  [3,16,0,0,0,-0.9239,0,-0.3827,-0.7071,0,-0.7071],
// 3 16 0 0 0 -0.7071 0 -0.7071 -0.3827 0 -0.9239
  [3,16,0,0,0,-0.7071,0,-0.7071,-0.3827,0,-0.9239],
// 3 16 0 0 0 -0.3827 0 -0.9239 0 0 -1
  [3,16,0,0,0,-0.3827,0,-0.9239,0,0,-1],
// 3 16 0 0 0 0 0 -1 0.3827 0 -0.9239
  [3,16,0,0,0,0,0,-1,0.3827,0,-0.9239],
// 3 16 0 0 0 0.3827 0 -0.9239 0.7071 0 -0.7071
  [3,16,0,0,0,0.3827,0,-0.9239,0.7071,0,-0.7071],
// 3 16 0 0 0 0.7071 0 -0.7071 0.9239 0 -0.3827
  [3,16,0,0,0,0.7071,0,-0.7071,0.9239,0,-0.3827],
// 3 16 0 0 0 0.9239 0 -0.3827 1 0 0
  [3,16,0,0,0,0.9239,0,-0.3827,1,0,0],
// 0
];
makepoly(ldraw_lib__4_4disc(), line=0.2);
// main file
use <../lib.scad>
use <../p/4-4disc.scad>
use <s/98138s01.scad>
function ldraw_lib__98138() = [
// 0 Tile  1 x  1 Round with Groove
// 0 Name: 98138.dat
// 0 Author: Magnus Forsberg [MagFors]
// 0 !LDRAW_ORG Part UPDATE 2011-02
// 0 !LICENSE Licensed under CC BY 2.0 and CC BY 4.0 : see CAreadme.txt
// 
// 0 BFC CERTIFY CCW
  [0,"BFC","CERTIFY"],
  [0,"BFC","CCW"],
// 
// 0 !HISTORY 2011-12-29 [PTadmin] Official Update 2011-02
// 
// 
// 1 16 0 0 0 1 0 0 0 1 0 0 0 1 s\98138s01.dat
  [1,16,0,0,0,1,0,0,0,1,0,0,0,1, ldraw_lib__s__98138s01()],
// 1 16 0 0 0 9 0 0 0 1 0 0 0 9 4-4disc.dat
  [1,16,0,0,0,9,0,0,0,1,0,0,0,9, ldraw_lib__4_4disc()],
// 
];
makepoly(ldraw_lib__98138(), line=0.2);
